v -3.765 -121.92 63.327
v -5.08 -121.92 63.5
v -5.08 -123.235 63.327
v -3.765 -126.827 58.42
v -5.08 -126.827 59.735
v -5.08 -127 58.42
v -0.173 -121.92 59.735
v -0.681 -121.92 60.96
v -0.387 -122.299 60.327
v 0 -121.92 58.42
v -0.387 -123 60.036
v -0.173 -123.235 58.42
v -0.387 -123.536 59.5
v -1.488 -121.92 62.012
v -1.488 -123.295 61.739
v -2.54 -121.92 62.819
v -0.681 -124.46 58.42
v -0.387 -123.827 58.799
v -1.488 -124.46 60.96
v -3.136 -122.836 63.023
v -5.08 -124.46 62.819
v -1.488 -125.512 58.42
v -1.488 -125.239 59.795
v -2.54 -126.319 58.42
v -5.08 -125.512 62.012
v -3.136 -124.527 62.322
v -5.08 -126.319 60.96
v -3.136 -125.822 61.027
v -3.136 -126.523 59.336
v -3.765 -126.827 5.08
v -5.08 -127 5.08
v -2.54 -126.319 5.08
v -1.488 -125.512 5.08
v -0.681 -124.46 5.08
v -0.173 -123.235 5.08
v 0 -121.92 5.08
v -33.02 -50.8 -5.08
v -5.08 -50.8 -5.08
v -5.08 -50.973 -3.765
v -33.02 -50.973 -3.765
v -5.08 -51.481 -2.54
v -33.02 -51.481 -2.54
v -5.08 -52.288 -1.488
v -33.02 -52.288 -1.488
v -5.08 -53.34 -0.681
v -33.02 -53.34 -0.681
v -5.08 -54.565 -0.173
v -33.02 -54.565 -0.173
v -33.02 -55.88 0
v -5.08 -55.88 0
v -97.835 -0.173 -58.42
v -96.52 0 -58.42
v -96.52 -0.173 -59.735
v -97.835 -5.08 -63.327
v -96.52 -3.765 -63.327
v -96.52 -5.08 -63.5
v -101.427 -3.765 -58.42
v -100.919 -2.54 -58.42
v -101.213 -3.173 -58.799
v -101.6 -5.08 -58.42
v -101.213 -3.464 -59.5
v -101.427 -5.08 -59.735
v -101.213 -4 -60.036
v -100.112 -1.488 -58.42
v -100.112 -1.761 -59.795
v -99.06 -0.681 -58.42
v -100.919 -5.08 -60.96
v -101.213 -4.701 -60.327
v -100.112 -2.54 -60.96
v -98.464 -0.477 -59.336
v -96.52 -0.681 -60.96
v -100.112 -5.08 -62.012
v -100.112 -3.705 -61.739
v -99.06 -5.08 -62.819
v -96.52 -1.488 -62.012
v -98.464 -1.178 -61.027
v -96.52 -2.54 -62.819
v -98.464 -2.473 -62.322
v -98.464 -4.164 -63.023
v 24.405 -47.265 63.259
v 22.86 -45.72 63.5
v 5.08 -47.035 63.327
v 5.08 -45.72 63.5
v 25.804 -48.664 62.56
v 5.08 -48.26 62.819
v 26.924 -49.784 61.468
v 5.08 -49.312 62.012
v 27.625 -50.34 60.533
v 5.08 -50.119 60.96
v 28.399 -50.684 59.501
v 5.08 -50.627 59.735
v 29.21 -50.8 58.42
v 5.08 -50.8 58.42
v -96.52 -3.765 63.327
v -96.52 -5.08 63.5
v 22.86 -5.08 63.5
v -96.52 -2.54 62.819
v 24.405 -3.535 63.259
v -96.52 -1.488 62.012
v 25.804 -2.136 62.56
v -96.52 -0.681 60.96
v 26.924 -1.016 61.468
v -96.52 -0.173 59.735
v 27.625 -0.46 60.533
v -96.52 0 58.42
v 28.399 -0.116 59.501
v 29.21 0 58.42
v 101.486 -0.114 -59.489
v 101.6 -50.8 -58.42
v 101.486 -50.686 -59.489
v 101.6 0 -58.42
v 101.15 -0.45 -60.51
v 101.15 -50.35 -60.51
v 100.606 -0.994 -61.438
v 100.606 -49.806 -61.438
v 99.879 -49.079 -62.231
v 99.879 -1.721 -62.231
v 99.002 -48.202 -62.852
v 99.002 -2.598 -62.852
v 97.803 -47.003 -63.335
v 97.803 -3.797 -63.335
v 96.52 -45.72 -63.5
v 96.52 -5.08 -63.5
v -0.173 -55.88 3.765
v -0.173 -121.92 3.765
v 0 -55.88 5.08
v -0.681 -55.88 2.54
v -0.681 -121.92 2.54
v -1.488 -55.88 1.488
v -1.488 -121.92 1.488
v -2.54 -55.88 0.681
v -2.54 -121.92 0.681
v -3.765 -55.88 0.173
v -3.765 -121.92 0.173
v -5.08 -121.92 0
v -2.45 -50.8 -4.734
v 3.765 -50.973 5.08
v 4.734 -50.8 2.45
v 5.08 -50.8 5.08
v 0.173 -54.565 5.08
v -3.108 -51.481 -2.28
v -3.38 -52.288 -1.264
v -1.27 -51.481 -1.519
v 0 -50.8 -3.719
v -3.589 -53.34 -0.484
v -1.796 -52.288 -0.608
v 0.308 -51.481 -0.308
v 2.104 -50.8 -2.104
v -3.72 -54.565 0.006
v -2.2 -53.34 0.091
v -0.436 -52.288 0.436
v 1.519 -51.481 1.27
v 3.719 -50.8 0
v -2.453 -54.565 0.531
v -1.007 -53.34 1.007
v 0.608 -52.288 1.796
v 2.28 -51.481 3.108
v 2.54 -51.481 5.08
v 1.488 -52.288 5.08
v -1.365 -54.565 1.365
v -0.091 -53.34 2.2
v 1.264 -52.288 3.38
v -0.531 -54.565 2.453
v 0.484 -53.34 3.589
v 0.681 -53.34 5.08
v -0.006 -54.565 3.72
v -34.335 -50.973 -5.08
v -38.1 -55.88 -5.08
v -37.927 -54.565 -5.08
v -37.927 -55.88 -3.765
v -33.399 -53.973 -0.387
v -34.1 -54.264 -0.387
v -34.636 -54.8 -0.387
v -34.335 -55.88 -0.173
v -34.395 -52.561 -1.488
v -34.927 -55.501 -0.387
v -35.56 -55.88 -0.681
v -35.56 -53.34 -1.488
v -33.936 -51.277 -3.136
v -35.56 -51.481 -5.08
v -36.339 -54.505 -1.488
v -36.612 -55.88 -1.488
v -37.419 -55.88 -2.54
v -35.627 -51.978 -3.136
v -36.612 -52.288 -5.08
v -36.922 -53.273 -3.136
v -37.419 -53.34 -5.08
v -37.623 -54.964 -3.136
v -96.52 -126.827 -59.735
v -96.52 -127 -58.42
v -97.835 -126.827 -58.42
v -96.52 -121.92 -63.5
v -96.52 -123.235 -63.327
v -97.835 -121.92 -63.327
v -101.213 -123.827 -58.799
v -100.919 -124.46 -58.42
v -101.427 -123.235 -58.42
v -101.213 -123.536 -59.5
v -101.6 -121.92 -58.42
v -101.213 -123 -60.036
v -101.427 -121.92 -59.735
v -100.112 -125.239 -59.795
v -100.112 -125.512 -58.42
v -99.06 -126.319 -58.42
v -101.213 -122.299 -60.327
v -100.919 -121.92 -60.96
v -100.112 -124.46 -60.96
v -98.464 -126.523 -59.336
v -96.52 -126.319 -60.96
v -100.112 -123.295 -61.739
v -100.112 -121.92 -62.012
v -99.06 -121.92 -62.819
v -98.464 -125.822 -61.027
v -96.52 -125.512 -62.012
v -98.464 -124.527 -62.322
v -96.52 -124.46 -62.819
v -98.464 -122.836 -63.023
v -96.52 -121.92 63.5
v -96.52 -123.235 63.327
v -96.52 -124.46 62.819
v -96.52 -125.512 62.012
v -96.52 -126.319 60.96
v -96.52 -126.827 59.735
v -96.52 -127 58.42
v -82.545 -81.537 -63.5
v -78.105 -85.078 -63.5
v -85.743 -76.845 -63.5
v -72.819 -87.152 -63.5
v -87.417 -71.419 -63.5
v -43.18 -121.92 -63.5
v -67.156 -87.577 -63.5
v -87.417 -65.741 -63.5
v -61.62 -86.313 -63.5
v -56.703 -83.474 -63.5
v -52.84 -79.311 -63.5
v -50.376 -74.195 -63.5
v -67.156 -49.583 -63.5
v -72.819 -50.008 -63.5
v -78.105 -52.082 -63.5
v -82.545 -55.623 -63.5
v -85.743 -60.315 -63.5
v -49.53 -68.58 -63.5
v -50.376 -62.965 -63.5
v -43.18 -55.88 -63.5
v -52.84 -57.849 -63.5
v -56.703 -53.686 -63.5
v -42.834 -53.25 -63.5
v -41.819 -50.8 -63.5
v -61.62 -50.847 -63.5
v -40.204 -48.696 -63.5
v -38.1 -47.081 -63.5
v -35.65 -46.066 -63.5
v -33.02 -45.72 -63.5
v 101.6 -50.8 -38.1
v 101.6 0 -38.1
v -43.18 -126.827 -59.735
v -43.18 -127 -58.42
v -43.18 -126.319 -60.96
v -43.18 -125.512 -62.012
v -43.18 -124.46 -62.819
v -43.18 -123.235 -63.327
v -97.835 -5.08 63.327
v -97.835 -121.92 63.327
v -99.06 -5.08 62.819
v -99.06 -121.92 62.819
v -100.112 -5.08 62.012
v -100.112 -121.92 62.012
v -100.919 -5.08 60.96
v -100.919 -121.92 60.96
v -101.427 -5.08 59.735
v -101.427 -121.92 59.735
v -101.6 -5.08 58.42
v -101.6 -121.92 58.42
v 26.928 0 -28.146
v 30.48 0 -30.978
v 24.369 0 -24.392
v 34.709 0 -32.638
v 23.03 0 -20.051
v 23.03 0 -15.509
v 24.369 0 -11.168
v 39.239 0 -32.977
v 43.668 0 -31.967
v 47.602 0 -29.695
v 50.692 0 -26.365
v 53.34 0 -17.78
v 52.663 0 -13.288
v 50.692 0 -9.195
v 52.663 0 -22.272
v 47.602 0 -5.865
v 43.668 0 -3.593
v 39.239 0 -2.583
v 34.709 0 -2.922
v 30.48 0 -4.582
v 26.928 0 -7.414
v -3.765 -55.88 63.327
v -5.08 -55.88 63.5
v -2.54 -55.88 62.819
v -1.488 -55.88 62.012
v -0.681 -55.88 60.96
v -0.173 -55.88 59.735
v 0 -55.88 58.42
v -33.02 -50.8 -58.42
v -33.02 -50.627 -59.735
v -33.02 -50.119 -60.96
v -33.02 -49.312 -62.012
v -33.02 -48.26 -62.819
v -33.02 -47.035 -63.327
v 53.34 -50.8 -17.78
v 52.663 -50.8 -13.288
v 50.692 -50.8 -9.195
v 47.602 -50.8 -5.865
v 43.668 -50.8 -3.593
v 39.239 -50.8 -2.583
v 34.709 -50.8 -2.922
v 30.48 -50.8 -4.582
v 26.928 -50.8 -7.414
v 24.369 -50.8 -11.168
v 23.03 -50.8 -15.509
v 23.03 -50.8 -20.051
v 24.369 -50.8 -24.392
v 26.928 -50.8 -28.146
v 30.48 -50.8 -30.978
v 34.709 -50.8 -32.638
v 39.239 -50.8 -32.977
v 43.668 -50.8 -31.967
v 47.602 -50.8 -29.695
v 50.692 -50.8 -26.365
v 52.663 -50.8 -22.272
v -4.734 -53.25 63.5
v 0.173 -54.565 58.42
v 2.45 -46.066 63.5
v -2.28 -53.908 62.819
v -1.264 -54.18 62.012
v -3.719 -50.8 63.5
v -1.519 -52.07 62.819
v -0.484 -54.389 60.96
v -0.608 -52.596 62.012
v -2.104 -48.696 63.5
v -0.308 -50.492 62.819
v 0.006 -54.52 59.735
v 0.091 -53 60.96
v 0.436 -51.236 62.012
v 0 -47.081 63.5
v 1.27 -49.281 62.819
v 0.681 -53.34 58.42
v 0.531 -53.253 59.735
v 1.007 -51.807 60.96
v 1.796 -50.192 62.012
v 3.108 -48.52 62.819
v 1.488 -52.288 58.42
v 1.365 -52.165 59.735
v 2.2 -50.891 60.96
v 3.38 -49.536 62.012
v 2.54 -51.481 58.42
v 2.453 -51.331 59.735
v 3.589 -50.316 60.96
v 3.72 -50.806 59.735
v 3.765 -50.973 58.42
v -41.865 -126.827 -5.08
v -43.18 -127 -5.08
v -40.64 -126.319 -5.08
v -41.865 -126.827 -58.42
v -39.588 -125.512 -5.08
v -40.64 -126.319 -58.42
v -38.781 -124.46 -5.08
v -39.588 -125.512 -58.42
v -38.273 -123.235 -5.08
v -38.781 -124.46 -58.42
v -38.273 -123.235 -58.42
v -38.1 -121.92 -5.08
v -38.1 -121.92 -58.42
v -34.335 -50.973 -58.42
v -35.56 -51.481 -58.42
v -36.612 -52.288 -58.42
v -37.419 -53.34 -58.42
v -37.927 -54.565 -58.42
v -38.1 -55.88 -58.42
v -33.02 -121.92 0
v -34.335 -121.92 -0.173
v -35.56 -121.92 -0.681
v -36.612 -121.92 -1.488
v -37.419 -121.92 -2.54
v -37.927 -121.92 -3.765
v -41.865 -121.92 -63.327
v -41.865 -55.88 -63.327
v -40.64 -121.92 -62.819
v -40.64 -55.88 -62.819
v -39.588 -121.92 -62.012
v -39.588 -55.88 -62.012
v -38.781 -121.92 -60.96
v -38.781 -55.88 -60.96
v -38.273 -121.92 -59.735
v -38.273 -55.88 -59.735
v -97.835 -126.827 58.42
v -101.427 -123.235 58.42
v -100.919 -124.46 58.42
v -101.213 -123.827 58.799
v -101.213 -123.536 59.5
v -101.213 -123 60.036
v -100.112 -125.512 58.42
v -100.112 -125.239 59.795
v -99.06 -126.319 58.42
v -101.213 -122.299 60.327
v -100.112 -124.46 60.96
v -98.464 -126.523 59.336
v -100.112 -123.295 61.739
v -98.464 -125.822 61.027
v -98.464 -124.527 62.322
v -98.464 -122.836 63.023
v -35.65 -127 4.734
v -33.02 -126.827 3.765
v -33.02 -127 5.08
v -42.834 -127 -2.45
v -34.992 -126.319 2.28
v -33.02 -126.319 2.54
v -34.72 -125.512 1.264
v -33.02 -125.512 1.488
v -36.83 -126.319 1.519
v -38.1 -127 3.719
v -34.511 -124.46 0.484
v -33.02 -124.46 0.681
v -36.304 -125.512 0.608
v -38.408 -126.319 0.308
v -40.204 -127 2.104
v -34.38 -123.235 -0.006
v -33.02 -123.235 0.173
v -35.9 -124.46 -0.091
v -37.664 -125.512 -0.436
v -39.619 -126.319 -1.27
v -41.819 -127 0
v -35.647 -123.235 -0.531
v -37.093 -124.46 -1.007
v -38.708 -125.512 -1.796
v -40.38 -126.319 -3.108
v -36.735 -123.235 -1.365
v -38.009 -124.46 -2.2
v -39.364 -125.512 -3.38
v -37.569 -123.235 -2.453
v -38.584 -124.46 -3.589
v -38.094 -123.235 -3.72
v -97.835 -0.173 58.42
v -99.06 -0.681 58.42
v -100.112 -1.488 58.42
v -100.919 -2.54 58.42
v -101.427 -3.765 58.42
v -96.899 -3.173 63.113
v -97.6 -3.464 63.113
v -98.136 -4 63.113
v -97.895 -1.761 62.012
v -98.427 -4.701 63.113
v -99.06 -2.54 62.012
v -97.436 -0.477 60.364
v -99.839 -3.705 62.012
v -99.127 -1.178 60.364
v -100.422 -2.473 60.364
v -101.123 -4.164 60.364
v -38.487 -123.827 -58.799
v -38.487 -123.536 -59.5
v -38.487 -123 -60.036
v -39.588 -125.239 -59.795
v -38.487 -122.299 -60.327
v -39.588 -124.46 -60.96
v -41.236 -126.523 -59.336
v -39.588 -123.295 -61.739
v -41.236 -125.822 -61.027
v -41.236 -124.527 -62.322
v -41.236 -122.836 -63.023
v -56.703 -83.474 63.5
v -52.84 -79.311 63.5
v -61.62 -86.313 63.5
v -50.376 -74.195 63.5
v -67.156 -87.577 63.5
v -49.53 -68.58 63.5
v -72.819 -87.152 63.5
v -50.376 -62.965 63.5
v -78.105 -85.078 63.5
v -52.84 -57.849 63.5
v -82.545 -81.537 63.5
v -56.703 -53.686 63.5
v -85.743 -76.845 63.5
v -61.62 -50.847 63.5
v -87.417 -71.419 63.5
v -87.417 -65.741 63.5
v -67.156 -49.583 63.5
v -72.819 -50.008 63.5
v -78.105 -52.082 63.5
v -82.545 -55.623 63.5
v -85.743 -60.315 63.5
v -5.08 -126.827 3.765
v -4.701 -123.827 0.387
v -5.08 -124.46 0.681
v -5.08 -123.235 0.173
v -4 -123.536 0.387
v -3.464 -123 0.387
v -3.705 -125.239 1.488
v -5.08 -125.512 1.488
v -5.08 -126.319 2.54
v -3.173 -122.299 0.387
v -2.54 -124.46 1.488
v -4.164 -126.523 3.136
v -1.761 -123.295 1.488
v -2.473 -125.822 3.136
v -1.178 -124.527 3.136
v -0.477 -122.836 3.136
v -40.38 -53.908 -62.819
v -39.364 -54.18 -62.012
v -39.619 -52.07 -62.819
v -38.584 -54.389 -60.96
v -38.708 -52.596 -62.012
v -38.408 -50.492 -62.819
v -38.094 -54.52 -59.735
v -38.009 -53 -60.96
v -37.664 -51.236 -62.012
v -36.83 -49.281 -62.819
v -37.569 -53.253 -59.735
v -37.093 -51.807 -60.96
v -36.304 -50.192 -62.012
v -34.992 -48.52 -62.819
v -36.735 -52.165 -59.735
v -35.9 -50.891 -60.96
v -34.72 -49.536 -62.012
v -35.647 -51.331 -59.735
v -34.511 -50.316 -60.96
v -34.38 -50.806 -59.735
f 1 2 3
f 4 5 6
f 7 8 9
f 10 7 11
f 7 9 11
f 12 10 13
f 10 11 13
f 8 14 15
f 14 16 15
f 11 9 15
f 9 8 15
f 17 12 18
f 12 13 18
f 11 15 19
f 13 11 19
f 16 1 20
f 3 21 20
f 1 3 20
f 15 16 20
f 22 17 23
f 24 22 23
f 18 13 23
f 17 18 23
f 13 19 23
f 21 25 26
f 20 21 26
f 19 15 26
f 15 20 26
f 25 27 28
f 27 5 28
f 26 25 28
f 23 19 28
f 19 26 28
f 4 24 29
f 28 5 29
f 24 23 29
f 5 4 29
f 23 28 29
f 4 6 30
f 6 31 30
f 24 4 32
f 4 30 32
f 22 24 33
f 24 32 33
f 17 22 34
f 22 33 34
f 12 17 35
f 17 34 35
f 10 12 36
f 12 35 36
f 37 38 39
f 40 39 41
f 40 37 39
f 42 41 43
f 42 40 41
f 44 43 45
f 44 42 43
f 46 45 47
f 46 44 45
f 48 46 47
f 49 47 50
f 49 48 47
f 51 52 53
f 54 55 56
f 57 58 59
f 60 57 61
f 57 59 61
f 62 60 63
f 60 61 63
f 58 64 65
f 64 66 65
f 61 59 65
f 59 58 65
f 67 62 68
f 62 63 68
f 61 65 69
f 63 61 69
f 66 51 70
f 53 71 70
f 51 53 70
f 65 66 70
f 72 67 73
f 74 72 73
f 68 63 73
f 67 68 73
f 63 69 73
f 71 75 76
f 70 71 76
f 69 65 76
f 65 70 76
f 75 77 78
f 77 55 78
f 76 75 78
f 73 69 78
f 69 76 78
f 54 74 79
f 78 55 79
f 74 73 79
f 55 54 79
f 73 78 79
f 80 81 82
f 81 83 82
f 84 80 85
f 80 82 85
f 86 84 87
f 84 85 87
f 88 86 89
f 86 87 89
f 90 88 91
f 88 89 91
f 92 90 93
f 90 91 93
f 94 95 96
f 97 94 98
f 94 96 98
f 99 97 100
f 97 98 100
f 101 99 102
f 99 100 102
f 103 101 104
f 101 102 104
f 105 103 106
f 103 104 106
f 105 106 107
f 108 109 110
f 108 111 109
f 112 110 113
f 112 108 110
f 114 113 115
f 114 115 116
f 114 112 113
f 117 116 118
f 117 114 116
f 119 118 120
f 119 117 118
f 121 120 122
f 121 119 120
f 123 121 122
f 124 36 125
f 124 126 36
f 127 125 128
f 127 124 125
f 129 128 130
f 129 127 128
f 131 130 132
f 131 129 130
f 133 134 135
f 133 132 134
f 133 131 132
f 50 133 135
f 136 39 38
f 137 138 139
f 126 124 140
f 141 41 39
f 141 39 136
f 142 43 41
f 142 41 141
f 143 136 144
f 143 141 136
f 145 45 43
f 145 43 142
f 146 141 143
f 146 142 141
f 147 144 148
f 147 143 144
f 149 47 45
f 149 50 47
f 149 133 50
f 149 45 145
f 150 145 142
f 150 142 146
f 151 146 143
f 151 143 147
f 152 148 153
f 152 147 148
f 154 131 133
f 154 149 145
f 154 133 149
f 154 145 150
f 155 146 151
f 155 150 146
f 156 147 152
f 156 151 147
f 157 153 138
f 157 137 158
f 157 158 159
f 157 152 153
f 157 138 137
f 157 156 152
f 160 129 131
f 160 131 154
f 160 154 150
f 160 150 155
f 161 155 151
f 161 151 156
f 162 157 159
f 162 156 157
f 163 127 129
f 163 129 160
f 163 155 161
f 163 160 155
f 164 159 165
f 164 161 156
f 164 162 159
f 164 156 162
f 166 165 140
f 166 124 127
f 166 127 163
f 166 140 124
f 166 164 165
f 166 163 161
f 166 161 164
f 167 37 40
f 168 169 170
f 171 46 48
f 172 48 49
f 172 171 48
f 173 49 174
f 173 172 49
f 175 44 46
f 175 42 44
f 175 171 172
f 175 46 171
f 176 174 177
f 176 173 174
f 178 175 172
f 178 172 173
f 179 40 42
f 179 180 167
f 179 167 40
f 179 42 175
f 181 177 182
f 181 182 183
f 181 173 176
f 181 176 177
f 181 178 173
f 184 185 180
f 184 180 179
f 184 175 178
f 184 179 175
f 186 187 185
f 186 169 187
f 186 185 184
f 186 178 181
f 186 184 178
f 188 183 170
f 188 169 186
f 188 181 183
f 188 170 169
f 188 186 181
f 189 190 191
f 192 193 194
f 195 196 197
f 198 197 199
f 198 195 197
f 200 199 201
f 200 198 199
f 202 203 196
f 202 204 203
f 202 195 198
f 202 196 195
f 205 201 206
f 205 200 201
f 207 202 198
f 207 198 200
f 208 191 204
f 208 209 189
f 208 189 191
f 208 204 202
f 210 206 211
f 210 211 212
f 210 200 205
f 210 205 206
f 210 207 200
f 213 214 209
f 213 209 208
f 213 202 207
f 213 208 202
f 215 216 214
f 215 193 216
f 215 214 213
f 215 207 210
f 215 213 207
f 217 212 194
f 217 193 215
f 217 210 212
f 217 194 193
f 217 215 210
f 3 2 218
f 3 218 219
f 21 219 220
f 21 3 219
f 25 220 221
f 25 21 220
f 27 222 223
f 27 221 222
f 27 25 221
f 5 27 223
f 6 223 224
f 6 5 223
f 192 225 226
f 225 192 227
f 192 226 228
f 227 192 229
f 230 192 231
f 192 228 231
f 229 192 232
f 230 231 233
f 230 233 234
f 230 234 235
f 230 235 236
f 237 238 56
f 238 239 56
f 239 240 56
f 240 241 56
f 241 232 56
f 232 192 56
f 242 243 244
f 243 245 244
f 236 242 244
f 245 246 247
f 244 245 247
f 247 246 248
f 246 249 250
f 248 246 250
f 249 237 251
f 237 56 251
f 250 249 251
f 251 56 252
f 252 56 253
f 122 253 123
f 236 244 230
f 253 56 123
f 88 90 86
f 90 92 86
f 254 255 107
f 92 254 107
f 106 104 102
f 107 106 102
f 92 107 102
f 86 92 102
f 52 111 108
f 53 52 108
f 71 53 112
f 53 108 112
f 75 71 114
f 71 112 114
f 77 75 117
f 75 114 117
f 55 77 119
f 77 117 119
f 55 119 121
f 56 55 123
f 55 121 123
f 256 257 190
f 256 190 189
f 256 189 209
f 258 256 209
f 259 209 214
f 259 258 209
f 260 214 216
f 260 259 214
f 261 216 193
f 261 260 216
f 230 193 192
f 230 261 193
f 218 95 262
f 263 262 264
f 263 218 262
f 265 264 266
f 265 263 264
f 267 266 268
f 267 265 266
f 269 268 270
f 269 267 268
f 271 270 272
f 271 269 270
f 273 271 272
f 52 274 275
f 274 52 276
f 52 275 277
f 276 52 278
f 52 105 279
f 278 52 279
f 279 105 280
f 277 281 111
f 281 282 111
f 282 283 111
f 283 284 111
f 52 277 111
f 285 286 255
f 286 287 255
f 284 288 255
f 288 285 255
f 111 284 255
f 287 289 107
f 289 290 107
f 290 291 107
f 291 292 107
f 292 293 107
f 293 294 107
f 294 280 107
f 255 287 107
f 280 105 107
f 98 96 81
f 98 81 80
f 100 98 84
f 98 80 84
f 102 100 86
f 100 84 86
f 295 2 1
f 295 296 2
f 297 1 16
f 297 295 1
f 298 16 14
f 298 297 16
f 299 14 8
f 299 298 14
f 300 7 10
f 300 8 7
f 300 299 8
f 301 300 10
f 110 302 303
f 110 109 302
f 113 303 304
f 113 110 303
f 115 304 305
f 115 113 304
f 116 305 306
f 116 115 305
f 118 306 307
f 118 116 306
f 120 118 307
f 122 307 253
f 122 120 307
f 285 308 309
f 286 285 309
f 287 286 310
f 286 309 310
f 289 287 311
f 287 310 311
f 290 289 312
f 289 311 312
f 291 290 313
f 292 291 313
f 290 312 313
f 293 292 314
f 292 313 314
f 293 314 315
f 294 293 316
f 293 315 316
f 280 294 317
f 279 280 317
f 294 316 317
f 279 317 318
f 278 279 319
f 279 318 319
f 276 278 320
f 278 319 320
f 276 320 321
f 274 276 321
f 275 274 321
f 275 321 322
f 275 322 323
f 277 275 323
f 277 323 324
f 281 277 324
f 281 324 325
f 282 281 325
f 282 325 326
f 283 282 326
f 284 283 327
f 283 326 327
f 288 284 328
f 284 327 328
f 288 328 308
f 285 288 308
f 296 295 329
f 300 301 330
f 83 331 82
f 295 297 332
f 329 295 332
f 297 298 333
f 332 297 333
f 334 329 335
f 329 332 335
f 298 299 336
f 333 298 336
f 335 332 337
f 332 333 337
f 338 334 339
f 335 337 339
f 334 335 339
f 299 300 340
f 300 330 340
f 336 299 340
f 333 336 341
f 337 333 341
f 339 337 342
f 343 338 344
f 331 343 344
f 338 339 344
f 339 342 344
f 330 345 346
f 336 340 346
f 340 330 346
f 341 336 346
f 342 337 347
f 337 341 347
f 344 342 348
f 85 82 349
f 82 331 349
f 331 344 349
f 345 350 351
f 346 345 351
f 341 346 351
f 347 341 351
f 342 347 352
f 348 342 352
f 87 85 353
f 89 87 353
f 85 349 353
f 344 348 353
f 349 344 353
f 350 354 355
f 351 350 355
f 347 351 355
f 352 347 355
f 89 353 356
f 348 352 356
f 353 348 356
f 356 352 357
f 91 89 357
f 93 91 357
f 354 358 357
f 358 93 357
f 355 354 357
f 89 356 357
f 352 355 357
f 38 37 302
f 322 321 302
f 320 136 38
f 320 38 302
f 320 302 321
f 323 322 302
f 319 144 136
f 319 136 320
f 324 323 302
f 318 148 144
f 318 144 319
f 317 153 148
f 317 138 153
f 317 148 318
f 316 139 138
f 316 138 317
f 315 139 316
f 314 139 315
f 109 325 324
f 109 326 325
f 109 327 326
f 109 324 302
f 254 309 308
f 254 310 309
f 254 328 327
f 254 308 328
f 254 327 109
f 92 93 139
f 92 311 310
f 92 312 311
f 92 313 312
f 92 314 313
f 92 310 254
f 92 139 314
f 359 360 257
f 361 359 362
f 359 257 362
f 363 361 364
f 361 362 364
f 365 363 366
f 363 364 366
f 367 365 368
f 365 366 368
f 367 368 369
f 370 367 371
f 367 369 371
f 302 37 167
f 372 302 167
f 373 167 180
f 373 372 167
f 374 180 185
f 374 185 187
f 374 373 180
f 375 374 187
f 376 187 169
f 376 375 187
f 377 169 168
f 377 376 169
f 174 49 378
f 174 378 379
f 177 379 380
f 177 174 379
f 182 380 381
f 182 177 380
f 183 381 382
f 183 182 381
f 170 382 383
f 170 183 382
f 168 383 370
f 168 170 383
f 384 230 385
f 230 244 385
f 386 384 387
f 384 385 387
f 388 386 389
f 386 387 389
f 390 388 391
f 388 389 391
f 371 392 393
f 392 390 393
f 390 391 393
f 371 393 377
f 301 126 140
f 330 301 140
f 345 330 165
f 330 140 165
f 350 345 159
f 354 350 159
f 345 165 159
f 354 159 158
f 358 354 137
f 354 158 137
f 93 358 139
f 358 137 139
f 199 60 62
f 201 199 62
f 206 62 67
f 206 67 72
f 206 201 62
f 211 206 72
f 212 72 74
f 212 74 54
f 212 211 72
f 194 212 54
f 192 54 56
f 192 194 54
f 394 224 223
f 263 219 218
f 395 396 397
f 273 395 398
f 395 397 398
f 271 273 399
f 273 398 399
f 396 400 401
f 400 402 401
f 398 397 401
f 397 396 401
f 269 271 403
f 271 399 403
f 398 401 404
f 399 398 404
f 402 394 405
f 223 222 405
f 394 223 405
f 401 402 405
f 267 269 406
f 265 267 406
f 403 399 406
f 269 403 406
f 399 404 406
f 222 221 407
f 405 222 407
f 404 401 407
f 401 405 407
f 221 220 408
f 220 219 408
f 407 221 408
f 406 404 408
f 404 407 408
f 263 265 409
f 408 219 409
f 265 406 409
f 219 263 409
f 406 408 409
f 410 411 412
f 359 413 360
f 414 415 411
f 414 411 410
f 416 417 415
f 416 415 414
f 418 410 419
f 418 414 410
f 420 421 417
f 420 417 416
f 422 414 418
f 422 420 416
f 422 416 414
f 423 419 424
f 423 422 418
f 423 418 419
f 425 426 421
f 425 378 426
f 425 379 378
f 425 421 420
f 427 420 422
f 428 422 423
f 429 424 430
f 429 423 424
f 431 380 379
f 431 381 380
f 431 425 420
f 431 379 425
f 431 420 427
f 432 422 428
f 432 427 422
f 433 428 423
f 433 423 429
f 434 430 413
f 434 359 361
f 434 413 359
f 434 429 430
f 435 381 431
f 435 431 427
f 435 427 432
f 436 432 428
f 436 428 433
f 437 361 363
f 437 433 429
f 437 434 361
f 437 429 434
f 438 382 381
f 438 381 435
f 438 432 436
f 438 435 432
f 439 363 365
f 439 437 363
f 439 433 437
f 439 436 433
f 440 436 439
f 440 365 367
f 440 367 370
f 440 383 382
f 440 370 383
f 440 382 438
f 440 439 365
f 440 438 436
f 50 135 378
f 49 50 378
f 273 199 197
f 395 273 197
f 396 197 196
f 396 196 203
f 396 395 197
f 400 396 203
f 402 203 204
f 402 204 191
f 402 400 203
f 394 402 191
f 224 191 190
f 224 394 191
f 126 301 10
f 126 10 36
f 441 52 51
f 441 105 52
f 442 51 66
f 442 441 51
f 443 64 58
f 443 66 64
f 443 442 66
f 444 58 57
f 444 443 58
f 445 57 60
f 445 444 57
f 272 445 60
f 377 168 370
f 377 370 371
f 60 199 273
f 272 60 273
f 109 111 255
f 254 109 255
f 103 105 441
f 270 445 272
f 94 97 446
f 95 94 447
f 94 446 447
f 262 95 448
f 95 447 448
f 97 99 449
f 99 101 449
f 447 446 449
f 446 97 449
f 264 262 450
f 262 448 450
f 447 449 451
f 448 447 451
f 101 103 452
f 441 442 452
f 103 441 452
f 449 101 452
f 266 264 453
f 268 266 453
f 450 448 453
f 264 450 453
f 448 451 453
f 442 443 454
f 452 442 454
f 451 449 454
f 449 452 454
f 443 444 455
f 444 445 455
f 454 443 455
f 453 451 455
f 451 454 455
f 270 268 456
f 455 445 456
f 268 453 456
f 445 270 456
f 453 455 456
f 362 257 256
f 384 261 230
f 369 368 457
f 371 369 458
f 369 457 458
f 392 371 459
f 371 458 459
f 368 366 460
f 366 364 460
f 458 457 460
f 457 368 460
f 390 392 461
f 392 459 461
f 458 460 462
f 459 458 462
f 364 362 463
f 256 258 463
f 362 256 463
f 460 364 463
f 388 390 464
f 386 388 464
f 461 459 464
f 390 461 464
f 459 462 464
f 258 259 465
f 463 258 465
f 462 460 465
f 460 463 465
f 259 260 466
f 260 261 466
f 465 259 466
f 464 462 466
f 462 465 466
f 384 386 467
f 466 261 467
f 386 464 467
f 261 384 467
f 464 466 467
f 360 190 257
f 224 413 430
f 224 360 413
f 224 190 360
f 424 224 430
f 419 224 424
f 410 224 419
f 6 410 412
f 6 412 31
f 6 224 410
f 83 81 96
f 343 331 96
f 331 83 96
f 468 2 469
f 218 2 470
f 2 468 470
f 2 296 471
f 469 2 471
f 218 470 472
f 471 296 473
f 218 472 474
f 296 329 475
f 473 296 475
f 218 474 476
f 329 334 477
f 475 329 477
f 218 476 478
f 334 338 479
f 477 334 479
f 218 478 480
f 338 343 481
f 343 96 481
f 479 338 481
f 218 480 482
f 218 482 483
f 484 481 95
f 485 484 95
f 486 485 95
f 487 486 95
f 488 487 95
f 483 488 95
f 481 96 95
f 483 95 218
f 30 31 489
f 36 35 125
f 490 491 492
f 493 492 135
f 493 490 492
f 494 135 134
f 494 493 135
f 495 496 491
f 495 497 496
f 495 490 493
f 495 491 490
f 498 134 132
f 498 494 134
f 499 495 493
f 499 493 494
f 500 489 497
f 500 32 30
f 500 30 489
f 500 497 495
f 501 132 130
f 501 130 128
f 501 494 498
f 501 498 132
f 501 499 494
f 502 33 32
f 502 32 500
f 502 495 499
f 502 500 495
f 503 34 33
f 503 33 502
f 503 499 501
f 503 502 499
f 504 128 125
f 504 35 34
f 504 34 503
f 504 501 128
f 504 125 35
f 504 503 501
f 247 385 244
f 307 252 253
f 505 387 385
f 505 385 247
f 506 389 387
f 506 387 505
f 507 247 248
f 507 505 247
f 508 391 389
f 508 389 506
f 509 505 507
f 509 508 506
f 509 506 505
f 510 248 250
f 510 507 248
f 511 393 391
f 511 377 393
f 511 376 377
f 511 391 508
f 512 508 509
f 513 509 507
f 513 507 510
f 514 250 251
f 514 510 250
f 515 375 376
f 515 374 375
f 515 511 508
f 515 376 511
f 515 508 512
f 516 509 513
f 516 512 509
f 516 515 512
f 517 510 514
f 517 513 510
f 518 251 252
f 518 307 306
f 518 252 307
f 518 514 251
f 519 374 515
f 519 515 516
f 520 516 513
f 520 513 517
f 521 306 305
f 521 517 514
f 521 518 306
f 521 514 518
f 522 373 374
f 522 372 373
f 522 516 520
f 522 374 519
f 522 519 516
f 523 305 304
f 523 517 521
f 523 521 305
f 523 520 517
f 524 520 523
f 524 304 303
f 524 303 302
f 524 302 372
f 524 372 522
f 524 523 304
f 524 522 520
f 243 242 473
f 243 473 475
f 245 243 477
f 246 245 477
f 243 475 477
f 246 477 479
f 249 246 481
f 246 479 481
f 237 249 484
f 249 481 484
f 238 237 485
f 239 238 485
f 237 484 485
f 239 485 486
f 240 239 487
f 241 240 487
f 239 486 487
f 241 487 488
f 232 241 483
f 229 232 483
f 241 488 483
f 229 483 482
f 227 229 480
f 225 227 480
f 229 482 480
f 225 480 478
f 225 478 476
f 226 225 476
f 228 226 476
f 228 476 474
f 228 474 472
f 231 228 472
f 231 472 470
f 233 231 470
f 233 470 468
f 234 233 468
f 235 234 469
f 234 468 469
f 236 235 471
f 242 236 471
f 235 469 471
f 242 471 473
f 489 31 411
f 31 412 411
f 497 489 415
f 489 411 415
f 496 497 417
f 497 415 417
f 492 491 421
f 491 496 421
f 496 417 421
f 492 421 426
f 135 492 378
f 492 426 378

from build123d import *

# Parameters (mm, degrees)
F0_W        = 203.2
F0_H        = 127
F1_DEPTH    = 127
F3_DEPTH    = 25.4
F4_DEPTH    = 101.6
F5_T1_DEPTH = 575.1977482789
F6_R        = 5.08
F7_R        = 15.24
F8_DEPTH    = 50.8
F9_R        = 19.05
F10_DEPTH   = 127


# Not quite as in the source:
# - a fillet or chamfer that OpenCascade refuses, or shapes differently, is made with other operations: its cross-section is extruded or revolved along the edge and cut away or added


with BuildPart() as f1:
    # F0 (on Front) → F1 (new body)
    with BuildSketch(Plane.XZ):
        Rectangle(F0_W, F0_H)
    extrude(amount=F1_DEPTH)

    # F2 (on face) → F3 (join)
    with BuildSketch(Plane.XZ.offset(127)):
        Polygon((101.6, 63.5), (0, 63.5), (0, 0), (-38.1, 0), (-38.1, -63.5), (101.6, -63.5), align=None)
    extrude(amount=F3_DEPTH)

    # F4 (cut): a face of the model
    f4_faces = [f1.faces().sort_by_distance(p)[0] for p in [
        (39.7710526316, -152.4, -5.0131578947),
    ]]
    extrude(f4_faces, amount=-F4_DEPTH, mode=Mode.SUBTRACT)

    # F5: chamfer of 76.2 x 101.6 on 1 edges, made by hand

    # F5_s2 → F5_t1 (cut)
    with BuildSketch(Plane.XZ.offset(-262.1988741395)):
        Polygon((101.6, -38.1), (25.4, 63.5), (101.6, 63.5), align=None)
    extrude(amount=F5_T1_DEPTH, mode=Mode.SUBTRACT)

    # F6
    f6_edges = [f1.edges().sort_by_distance(p)[0] for p in [
        (-50.8, -127, 63.5),
        (0, -88.9, 63.5),
        (0, -127, 31.75),
        (-19.05, -127, 0),
        (-69.85, -127, -63.5),
        (-101.6, -127, 0),
        (-38.1, -127, -31.75),
        (-38.1, -88.9, -63.5),
        (31.75, -50.8, -63.5),
        (-38.1, -50.8, -31.75),
        (101.6, -25.4, -63.5),
        (0, 0, -63.5),
        (-101.6, 0, 0),
        (-101.6, -63.5, -63.5),
        (12.7, -50.8, 63.5),
        (25.4, -25.4, 63.5),
        (-38.1, 0, 63.5),
        (0, -88.9, 0),
        (-19.05, -50.8, 0),
        (-38.1, -88.9, 0),
        (-101.6, -63.5, 63.5),
        (0, -50.8, 31.75),
    ]]
    fillet(f6_edges, radius=F6_R)

    # F7 (on face) → F8 (cut, through all)
    with BuildSketch(Plane.XZ.offset(50.8)):
        with Locations((38.1, -17.78)):
            Circle(F7_R)
    extrude(amount=-F8_DEPTH, mode=Mode.SUBTRACT)

    # F9 (on face) → F10 (cut, through all)
    with BuildSketch(Plane.XY.offset(63.5)):
        with Locations((-68.58, -68.58)):
            Circle(F9_R)
    extrude(amount=-F10_DEPTH, mode=Mode.SUBTRACT)


solid = f1.part
